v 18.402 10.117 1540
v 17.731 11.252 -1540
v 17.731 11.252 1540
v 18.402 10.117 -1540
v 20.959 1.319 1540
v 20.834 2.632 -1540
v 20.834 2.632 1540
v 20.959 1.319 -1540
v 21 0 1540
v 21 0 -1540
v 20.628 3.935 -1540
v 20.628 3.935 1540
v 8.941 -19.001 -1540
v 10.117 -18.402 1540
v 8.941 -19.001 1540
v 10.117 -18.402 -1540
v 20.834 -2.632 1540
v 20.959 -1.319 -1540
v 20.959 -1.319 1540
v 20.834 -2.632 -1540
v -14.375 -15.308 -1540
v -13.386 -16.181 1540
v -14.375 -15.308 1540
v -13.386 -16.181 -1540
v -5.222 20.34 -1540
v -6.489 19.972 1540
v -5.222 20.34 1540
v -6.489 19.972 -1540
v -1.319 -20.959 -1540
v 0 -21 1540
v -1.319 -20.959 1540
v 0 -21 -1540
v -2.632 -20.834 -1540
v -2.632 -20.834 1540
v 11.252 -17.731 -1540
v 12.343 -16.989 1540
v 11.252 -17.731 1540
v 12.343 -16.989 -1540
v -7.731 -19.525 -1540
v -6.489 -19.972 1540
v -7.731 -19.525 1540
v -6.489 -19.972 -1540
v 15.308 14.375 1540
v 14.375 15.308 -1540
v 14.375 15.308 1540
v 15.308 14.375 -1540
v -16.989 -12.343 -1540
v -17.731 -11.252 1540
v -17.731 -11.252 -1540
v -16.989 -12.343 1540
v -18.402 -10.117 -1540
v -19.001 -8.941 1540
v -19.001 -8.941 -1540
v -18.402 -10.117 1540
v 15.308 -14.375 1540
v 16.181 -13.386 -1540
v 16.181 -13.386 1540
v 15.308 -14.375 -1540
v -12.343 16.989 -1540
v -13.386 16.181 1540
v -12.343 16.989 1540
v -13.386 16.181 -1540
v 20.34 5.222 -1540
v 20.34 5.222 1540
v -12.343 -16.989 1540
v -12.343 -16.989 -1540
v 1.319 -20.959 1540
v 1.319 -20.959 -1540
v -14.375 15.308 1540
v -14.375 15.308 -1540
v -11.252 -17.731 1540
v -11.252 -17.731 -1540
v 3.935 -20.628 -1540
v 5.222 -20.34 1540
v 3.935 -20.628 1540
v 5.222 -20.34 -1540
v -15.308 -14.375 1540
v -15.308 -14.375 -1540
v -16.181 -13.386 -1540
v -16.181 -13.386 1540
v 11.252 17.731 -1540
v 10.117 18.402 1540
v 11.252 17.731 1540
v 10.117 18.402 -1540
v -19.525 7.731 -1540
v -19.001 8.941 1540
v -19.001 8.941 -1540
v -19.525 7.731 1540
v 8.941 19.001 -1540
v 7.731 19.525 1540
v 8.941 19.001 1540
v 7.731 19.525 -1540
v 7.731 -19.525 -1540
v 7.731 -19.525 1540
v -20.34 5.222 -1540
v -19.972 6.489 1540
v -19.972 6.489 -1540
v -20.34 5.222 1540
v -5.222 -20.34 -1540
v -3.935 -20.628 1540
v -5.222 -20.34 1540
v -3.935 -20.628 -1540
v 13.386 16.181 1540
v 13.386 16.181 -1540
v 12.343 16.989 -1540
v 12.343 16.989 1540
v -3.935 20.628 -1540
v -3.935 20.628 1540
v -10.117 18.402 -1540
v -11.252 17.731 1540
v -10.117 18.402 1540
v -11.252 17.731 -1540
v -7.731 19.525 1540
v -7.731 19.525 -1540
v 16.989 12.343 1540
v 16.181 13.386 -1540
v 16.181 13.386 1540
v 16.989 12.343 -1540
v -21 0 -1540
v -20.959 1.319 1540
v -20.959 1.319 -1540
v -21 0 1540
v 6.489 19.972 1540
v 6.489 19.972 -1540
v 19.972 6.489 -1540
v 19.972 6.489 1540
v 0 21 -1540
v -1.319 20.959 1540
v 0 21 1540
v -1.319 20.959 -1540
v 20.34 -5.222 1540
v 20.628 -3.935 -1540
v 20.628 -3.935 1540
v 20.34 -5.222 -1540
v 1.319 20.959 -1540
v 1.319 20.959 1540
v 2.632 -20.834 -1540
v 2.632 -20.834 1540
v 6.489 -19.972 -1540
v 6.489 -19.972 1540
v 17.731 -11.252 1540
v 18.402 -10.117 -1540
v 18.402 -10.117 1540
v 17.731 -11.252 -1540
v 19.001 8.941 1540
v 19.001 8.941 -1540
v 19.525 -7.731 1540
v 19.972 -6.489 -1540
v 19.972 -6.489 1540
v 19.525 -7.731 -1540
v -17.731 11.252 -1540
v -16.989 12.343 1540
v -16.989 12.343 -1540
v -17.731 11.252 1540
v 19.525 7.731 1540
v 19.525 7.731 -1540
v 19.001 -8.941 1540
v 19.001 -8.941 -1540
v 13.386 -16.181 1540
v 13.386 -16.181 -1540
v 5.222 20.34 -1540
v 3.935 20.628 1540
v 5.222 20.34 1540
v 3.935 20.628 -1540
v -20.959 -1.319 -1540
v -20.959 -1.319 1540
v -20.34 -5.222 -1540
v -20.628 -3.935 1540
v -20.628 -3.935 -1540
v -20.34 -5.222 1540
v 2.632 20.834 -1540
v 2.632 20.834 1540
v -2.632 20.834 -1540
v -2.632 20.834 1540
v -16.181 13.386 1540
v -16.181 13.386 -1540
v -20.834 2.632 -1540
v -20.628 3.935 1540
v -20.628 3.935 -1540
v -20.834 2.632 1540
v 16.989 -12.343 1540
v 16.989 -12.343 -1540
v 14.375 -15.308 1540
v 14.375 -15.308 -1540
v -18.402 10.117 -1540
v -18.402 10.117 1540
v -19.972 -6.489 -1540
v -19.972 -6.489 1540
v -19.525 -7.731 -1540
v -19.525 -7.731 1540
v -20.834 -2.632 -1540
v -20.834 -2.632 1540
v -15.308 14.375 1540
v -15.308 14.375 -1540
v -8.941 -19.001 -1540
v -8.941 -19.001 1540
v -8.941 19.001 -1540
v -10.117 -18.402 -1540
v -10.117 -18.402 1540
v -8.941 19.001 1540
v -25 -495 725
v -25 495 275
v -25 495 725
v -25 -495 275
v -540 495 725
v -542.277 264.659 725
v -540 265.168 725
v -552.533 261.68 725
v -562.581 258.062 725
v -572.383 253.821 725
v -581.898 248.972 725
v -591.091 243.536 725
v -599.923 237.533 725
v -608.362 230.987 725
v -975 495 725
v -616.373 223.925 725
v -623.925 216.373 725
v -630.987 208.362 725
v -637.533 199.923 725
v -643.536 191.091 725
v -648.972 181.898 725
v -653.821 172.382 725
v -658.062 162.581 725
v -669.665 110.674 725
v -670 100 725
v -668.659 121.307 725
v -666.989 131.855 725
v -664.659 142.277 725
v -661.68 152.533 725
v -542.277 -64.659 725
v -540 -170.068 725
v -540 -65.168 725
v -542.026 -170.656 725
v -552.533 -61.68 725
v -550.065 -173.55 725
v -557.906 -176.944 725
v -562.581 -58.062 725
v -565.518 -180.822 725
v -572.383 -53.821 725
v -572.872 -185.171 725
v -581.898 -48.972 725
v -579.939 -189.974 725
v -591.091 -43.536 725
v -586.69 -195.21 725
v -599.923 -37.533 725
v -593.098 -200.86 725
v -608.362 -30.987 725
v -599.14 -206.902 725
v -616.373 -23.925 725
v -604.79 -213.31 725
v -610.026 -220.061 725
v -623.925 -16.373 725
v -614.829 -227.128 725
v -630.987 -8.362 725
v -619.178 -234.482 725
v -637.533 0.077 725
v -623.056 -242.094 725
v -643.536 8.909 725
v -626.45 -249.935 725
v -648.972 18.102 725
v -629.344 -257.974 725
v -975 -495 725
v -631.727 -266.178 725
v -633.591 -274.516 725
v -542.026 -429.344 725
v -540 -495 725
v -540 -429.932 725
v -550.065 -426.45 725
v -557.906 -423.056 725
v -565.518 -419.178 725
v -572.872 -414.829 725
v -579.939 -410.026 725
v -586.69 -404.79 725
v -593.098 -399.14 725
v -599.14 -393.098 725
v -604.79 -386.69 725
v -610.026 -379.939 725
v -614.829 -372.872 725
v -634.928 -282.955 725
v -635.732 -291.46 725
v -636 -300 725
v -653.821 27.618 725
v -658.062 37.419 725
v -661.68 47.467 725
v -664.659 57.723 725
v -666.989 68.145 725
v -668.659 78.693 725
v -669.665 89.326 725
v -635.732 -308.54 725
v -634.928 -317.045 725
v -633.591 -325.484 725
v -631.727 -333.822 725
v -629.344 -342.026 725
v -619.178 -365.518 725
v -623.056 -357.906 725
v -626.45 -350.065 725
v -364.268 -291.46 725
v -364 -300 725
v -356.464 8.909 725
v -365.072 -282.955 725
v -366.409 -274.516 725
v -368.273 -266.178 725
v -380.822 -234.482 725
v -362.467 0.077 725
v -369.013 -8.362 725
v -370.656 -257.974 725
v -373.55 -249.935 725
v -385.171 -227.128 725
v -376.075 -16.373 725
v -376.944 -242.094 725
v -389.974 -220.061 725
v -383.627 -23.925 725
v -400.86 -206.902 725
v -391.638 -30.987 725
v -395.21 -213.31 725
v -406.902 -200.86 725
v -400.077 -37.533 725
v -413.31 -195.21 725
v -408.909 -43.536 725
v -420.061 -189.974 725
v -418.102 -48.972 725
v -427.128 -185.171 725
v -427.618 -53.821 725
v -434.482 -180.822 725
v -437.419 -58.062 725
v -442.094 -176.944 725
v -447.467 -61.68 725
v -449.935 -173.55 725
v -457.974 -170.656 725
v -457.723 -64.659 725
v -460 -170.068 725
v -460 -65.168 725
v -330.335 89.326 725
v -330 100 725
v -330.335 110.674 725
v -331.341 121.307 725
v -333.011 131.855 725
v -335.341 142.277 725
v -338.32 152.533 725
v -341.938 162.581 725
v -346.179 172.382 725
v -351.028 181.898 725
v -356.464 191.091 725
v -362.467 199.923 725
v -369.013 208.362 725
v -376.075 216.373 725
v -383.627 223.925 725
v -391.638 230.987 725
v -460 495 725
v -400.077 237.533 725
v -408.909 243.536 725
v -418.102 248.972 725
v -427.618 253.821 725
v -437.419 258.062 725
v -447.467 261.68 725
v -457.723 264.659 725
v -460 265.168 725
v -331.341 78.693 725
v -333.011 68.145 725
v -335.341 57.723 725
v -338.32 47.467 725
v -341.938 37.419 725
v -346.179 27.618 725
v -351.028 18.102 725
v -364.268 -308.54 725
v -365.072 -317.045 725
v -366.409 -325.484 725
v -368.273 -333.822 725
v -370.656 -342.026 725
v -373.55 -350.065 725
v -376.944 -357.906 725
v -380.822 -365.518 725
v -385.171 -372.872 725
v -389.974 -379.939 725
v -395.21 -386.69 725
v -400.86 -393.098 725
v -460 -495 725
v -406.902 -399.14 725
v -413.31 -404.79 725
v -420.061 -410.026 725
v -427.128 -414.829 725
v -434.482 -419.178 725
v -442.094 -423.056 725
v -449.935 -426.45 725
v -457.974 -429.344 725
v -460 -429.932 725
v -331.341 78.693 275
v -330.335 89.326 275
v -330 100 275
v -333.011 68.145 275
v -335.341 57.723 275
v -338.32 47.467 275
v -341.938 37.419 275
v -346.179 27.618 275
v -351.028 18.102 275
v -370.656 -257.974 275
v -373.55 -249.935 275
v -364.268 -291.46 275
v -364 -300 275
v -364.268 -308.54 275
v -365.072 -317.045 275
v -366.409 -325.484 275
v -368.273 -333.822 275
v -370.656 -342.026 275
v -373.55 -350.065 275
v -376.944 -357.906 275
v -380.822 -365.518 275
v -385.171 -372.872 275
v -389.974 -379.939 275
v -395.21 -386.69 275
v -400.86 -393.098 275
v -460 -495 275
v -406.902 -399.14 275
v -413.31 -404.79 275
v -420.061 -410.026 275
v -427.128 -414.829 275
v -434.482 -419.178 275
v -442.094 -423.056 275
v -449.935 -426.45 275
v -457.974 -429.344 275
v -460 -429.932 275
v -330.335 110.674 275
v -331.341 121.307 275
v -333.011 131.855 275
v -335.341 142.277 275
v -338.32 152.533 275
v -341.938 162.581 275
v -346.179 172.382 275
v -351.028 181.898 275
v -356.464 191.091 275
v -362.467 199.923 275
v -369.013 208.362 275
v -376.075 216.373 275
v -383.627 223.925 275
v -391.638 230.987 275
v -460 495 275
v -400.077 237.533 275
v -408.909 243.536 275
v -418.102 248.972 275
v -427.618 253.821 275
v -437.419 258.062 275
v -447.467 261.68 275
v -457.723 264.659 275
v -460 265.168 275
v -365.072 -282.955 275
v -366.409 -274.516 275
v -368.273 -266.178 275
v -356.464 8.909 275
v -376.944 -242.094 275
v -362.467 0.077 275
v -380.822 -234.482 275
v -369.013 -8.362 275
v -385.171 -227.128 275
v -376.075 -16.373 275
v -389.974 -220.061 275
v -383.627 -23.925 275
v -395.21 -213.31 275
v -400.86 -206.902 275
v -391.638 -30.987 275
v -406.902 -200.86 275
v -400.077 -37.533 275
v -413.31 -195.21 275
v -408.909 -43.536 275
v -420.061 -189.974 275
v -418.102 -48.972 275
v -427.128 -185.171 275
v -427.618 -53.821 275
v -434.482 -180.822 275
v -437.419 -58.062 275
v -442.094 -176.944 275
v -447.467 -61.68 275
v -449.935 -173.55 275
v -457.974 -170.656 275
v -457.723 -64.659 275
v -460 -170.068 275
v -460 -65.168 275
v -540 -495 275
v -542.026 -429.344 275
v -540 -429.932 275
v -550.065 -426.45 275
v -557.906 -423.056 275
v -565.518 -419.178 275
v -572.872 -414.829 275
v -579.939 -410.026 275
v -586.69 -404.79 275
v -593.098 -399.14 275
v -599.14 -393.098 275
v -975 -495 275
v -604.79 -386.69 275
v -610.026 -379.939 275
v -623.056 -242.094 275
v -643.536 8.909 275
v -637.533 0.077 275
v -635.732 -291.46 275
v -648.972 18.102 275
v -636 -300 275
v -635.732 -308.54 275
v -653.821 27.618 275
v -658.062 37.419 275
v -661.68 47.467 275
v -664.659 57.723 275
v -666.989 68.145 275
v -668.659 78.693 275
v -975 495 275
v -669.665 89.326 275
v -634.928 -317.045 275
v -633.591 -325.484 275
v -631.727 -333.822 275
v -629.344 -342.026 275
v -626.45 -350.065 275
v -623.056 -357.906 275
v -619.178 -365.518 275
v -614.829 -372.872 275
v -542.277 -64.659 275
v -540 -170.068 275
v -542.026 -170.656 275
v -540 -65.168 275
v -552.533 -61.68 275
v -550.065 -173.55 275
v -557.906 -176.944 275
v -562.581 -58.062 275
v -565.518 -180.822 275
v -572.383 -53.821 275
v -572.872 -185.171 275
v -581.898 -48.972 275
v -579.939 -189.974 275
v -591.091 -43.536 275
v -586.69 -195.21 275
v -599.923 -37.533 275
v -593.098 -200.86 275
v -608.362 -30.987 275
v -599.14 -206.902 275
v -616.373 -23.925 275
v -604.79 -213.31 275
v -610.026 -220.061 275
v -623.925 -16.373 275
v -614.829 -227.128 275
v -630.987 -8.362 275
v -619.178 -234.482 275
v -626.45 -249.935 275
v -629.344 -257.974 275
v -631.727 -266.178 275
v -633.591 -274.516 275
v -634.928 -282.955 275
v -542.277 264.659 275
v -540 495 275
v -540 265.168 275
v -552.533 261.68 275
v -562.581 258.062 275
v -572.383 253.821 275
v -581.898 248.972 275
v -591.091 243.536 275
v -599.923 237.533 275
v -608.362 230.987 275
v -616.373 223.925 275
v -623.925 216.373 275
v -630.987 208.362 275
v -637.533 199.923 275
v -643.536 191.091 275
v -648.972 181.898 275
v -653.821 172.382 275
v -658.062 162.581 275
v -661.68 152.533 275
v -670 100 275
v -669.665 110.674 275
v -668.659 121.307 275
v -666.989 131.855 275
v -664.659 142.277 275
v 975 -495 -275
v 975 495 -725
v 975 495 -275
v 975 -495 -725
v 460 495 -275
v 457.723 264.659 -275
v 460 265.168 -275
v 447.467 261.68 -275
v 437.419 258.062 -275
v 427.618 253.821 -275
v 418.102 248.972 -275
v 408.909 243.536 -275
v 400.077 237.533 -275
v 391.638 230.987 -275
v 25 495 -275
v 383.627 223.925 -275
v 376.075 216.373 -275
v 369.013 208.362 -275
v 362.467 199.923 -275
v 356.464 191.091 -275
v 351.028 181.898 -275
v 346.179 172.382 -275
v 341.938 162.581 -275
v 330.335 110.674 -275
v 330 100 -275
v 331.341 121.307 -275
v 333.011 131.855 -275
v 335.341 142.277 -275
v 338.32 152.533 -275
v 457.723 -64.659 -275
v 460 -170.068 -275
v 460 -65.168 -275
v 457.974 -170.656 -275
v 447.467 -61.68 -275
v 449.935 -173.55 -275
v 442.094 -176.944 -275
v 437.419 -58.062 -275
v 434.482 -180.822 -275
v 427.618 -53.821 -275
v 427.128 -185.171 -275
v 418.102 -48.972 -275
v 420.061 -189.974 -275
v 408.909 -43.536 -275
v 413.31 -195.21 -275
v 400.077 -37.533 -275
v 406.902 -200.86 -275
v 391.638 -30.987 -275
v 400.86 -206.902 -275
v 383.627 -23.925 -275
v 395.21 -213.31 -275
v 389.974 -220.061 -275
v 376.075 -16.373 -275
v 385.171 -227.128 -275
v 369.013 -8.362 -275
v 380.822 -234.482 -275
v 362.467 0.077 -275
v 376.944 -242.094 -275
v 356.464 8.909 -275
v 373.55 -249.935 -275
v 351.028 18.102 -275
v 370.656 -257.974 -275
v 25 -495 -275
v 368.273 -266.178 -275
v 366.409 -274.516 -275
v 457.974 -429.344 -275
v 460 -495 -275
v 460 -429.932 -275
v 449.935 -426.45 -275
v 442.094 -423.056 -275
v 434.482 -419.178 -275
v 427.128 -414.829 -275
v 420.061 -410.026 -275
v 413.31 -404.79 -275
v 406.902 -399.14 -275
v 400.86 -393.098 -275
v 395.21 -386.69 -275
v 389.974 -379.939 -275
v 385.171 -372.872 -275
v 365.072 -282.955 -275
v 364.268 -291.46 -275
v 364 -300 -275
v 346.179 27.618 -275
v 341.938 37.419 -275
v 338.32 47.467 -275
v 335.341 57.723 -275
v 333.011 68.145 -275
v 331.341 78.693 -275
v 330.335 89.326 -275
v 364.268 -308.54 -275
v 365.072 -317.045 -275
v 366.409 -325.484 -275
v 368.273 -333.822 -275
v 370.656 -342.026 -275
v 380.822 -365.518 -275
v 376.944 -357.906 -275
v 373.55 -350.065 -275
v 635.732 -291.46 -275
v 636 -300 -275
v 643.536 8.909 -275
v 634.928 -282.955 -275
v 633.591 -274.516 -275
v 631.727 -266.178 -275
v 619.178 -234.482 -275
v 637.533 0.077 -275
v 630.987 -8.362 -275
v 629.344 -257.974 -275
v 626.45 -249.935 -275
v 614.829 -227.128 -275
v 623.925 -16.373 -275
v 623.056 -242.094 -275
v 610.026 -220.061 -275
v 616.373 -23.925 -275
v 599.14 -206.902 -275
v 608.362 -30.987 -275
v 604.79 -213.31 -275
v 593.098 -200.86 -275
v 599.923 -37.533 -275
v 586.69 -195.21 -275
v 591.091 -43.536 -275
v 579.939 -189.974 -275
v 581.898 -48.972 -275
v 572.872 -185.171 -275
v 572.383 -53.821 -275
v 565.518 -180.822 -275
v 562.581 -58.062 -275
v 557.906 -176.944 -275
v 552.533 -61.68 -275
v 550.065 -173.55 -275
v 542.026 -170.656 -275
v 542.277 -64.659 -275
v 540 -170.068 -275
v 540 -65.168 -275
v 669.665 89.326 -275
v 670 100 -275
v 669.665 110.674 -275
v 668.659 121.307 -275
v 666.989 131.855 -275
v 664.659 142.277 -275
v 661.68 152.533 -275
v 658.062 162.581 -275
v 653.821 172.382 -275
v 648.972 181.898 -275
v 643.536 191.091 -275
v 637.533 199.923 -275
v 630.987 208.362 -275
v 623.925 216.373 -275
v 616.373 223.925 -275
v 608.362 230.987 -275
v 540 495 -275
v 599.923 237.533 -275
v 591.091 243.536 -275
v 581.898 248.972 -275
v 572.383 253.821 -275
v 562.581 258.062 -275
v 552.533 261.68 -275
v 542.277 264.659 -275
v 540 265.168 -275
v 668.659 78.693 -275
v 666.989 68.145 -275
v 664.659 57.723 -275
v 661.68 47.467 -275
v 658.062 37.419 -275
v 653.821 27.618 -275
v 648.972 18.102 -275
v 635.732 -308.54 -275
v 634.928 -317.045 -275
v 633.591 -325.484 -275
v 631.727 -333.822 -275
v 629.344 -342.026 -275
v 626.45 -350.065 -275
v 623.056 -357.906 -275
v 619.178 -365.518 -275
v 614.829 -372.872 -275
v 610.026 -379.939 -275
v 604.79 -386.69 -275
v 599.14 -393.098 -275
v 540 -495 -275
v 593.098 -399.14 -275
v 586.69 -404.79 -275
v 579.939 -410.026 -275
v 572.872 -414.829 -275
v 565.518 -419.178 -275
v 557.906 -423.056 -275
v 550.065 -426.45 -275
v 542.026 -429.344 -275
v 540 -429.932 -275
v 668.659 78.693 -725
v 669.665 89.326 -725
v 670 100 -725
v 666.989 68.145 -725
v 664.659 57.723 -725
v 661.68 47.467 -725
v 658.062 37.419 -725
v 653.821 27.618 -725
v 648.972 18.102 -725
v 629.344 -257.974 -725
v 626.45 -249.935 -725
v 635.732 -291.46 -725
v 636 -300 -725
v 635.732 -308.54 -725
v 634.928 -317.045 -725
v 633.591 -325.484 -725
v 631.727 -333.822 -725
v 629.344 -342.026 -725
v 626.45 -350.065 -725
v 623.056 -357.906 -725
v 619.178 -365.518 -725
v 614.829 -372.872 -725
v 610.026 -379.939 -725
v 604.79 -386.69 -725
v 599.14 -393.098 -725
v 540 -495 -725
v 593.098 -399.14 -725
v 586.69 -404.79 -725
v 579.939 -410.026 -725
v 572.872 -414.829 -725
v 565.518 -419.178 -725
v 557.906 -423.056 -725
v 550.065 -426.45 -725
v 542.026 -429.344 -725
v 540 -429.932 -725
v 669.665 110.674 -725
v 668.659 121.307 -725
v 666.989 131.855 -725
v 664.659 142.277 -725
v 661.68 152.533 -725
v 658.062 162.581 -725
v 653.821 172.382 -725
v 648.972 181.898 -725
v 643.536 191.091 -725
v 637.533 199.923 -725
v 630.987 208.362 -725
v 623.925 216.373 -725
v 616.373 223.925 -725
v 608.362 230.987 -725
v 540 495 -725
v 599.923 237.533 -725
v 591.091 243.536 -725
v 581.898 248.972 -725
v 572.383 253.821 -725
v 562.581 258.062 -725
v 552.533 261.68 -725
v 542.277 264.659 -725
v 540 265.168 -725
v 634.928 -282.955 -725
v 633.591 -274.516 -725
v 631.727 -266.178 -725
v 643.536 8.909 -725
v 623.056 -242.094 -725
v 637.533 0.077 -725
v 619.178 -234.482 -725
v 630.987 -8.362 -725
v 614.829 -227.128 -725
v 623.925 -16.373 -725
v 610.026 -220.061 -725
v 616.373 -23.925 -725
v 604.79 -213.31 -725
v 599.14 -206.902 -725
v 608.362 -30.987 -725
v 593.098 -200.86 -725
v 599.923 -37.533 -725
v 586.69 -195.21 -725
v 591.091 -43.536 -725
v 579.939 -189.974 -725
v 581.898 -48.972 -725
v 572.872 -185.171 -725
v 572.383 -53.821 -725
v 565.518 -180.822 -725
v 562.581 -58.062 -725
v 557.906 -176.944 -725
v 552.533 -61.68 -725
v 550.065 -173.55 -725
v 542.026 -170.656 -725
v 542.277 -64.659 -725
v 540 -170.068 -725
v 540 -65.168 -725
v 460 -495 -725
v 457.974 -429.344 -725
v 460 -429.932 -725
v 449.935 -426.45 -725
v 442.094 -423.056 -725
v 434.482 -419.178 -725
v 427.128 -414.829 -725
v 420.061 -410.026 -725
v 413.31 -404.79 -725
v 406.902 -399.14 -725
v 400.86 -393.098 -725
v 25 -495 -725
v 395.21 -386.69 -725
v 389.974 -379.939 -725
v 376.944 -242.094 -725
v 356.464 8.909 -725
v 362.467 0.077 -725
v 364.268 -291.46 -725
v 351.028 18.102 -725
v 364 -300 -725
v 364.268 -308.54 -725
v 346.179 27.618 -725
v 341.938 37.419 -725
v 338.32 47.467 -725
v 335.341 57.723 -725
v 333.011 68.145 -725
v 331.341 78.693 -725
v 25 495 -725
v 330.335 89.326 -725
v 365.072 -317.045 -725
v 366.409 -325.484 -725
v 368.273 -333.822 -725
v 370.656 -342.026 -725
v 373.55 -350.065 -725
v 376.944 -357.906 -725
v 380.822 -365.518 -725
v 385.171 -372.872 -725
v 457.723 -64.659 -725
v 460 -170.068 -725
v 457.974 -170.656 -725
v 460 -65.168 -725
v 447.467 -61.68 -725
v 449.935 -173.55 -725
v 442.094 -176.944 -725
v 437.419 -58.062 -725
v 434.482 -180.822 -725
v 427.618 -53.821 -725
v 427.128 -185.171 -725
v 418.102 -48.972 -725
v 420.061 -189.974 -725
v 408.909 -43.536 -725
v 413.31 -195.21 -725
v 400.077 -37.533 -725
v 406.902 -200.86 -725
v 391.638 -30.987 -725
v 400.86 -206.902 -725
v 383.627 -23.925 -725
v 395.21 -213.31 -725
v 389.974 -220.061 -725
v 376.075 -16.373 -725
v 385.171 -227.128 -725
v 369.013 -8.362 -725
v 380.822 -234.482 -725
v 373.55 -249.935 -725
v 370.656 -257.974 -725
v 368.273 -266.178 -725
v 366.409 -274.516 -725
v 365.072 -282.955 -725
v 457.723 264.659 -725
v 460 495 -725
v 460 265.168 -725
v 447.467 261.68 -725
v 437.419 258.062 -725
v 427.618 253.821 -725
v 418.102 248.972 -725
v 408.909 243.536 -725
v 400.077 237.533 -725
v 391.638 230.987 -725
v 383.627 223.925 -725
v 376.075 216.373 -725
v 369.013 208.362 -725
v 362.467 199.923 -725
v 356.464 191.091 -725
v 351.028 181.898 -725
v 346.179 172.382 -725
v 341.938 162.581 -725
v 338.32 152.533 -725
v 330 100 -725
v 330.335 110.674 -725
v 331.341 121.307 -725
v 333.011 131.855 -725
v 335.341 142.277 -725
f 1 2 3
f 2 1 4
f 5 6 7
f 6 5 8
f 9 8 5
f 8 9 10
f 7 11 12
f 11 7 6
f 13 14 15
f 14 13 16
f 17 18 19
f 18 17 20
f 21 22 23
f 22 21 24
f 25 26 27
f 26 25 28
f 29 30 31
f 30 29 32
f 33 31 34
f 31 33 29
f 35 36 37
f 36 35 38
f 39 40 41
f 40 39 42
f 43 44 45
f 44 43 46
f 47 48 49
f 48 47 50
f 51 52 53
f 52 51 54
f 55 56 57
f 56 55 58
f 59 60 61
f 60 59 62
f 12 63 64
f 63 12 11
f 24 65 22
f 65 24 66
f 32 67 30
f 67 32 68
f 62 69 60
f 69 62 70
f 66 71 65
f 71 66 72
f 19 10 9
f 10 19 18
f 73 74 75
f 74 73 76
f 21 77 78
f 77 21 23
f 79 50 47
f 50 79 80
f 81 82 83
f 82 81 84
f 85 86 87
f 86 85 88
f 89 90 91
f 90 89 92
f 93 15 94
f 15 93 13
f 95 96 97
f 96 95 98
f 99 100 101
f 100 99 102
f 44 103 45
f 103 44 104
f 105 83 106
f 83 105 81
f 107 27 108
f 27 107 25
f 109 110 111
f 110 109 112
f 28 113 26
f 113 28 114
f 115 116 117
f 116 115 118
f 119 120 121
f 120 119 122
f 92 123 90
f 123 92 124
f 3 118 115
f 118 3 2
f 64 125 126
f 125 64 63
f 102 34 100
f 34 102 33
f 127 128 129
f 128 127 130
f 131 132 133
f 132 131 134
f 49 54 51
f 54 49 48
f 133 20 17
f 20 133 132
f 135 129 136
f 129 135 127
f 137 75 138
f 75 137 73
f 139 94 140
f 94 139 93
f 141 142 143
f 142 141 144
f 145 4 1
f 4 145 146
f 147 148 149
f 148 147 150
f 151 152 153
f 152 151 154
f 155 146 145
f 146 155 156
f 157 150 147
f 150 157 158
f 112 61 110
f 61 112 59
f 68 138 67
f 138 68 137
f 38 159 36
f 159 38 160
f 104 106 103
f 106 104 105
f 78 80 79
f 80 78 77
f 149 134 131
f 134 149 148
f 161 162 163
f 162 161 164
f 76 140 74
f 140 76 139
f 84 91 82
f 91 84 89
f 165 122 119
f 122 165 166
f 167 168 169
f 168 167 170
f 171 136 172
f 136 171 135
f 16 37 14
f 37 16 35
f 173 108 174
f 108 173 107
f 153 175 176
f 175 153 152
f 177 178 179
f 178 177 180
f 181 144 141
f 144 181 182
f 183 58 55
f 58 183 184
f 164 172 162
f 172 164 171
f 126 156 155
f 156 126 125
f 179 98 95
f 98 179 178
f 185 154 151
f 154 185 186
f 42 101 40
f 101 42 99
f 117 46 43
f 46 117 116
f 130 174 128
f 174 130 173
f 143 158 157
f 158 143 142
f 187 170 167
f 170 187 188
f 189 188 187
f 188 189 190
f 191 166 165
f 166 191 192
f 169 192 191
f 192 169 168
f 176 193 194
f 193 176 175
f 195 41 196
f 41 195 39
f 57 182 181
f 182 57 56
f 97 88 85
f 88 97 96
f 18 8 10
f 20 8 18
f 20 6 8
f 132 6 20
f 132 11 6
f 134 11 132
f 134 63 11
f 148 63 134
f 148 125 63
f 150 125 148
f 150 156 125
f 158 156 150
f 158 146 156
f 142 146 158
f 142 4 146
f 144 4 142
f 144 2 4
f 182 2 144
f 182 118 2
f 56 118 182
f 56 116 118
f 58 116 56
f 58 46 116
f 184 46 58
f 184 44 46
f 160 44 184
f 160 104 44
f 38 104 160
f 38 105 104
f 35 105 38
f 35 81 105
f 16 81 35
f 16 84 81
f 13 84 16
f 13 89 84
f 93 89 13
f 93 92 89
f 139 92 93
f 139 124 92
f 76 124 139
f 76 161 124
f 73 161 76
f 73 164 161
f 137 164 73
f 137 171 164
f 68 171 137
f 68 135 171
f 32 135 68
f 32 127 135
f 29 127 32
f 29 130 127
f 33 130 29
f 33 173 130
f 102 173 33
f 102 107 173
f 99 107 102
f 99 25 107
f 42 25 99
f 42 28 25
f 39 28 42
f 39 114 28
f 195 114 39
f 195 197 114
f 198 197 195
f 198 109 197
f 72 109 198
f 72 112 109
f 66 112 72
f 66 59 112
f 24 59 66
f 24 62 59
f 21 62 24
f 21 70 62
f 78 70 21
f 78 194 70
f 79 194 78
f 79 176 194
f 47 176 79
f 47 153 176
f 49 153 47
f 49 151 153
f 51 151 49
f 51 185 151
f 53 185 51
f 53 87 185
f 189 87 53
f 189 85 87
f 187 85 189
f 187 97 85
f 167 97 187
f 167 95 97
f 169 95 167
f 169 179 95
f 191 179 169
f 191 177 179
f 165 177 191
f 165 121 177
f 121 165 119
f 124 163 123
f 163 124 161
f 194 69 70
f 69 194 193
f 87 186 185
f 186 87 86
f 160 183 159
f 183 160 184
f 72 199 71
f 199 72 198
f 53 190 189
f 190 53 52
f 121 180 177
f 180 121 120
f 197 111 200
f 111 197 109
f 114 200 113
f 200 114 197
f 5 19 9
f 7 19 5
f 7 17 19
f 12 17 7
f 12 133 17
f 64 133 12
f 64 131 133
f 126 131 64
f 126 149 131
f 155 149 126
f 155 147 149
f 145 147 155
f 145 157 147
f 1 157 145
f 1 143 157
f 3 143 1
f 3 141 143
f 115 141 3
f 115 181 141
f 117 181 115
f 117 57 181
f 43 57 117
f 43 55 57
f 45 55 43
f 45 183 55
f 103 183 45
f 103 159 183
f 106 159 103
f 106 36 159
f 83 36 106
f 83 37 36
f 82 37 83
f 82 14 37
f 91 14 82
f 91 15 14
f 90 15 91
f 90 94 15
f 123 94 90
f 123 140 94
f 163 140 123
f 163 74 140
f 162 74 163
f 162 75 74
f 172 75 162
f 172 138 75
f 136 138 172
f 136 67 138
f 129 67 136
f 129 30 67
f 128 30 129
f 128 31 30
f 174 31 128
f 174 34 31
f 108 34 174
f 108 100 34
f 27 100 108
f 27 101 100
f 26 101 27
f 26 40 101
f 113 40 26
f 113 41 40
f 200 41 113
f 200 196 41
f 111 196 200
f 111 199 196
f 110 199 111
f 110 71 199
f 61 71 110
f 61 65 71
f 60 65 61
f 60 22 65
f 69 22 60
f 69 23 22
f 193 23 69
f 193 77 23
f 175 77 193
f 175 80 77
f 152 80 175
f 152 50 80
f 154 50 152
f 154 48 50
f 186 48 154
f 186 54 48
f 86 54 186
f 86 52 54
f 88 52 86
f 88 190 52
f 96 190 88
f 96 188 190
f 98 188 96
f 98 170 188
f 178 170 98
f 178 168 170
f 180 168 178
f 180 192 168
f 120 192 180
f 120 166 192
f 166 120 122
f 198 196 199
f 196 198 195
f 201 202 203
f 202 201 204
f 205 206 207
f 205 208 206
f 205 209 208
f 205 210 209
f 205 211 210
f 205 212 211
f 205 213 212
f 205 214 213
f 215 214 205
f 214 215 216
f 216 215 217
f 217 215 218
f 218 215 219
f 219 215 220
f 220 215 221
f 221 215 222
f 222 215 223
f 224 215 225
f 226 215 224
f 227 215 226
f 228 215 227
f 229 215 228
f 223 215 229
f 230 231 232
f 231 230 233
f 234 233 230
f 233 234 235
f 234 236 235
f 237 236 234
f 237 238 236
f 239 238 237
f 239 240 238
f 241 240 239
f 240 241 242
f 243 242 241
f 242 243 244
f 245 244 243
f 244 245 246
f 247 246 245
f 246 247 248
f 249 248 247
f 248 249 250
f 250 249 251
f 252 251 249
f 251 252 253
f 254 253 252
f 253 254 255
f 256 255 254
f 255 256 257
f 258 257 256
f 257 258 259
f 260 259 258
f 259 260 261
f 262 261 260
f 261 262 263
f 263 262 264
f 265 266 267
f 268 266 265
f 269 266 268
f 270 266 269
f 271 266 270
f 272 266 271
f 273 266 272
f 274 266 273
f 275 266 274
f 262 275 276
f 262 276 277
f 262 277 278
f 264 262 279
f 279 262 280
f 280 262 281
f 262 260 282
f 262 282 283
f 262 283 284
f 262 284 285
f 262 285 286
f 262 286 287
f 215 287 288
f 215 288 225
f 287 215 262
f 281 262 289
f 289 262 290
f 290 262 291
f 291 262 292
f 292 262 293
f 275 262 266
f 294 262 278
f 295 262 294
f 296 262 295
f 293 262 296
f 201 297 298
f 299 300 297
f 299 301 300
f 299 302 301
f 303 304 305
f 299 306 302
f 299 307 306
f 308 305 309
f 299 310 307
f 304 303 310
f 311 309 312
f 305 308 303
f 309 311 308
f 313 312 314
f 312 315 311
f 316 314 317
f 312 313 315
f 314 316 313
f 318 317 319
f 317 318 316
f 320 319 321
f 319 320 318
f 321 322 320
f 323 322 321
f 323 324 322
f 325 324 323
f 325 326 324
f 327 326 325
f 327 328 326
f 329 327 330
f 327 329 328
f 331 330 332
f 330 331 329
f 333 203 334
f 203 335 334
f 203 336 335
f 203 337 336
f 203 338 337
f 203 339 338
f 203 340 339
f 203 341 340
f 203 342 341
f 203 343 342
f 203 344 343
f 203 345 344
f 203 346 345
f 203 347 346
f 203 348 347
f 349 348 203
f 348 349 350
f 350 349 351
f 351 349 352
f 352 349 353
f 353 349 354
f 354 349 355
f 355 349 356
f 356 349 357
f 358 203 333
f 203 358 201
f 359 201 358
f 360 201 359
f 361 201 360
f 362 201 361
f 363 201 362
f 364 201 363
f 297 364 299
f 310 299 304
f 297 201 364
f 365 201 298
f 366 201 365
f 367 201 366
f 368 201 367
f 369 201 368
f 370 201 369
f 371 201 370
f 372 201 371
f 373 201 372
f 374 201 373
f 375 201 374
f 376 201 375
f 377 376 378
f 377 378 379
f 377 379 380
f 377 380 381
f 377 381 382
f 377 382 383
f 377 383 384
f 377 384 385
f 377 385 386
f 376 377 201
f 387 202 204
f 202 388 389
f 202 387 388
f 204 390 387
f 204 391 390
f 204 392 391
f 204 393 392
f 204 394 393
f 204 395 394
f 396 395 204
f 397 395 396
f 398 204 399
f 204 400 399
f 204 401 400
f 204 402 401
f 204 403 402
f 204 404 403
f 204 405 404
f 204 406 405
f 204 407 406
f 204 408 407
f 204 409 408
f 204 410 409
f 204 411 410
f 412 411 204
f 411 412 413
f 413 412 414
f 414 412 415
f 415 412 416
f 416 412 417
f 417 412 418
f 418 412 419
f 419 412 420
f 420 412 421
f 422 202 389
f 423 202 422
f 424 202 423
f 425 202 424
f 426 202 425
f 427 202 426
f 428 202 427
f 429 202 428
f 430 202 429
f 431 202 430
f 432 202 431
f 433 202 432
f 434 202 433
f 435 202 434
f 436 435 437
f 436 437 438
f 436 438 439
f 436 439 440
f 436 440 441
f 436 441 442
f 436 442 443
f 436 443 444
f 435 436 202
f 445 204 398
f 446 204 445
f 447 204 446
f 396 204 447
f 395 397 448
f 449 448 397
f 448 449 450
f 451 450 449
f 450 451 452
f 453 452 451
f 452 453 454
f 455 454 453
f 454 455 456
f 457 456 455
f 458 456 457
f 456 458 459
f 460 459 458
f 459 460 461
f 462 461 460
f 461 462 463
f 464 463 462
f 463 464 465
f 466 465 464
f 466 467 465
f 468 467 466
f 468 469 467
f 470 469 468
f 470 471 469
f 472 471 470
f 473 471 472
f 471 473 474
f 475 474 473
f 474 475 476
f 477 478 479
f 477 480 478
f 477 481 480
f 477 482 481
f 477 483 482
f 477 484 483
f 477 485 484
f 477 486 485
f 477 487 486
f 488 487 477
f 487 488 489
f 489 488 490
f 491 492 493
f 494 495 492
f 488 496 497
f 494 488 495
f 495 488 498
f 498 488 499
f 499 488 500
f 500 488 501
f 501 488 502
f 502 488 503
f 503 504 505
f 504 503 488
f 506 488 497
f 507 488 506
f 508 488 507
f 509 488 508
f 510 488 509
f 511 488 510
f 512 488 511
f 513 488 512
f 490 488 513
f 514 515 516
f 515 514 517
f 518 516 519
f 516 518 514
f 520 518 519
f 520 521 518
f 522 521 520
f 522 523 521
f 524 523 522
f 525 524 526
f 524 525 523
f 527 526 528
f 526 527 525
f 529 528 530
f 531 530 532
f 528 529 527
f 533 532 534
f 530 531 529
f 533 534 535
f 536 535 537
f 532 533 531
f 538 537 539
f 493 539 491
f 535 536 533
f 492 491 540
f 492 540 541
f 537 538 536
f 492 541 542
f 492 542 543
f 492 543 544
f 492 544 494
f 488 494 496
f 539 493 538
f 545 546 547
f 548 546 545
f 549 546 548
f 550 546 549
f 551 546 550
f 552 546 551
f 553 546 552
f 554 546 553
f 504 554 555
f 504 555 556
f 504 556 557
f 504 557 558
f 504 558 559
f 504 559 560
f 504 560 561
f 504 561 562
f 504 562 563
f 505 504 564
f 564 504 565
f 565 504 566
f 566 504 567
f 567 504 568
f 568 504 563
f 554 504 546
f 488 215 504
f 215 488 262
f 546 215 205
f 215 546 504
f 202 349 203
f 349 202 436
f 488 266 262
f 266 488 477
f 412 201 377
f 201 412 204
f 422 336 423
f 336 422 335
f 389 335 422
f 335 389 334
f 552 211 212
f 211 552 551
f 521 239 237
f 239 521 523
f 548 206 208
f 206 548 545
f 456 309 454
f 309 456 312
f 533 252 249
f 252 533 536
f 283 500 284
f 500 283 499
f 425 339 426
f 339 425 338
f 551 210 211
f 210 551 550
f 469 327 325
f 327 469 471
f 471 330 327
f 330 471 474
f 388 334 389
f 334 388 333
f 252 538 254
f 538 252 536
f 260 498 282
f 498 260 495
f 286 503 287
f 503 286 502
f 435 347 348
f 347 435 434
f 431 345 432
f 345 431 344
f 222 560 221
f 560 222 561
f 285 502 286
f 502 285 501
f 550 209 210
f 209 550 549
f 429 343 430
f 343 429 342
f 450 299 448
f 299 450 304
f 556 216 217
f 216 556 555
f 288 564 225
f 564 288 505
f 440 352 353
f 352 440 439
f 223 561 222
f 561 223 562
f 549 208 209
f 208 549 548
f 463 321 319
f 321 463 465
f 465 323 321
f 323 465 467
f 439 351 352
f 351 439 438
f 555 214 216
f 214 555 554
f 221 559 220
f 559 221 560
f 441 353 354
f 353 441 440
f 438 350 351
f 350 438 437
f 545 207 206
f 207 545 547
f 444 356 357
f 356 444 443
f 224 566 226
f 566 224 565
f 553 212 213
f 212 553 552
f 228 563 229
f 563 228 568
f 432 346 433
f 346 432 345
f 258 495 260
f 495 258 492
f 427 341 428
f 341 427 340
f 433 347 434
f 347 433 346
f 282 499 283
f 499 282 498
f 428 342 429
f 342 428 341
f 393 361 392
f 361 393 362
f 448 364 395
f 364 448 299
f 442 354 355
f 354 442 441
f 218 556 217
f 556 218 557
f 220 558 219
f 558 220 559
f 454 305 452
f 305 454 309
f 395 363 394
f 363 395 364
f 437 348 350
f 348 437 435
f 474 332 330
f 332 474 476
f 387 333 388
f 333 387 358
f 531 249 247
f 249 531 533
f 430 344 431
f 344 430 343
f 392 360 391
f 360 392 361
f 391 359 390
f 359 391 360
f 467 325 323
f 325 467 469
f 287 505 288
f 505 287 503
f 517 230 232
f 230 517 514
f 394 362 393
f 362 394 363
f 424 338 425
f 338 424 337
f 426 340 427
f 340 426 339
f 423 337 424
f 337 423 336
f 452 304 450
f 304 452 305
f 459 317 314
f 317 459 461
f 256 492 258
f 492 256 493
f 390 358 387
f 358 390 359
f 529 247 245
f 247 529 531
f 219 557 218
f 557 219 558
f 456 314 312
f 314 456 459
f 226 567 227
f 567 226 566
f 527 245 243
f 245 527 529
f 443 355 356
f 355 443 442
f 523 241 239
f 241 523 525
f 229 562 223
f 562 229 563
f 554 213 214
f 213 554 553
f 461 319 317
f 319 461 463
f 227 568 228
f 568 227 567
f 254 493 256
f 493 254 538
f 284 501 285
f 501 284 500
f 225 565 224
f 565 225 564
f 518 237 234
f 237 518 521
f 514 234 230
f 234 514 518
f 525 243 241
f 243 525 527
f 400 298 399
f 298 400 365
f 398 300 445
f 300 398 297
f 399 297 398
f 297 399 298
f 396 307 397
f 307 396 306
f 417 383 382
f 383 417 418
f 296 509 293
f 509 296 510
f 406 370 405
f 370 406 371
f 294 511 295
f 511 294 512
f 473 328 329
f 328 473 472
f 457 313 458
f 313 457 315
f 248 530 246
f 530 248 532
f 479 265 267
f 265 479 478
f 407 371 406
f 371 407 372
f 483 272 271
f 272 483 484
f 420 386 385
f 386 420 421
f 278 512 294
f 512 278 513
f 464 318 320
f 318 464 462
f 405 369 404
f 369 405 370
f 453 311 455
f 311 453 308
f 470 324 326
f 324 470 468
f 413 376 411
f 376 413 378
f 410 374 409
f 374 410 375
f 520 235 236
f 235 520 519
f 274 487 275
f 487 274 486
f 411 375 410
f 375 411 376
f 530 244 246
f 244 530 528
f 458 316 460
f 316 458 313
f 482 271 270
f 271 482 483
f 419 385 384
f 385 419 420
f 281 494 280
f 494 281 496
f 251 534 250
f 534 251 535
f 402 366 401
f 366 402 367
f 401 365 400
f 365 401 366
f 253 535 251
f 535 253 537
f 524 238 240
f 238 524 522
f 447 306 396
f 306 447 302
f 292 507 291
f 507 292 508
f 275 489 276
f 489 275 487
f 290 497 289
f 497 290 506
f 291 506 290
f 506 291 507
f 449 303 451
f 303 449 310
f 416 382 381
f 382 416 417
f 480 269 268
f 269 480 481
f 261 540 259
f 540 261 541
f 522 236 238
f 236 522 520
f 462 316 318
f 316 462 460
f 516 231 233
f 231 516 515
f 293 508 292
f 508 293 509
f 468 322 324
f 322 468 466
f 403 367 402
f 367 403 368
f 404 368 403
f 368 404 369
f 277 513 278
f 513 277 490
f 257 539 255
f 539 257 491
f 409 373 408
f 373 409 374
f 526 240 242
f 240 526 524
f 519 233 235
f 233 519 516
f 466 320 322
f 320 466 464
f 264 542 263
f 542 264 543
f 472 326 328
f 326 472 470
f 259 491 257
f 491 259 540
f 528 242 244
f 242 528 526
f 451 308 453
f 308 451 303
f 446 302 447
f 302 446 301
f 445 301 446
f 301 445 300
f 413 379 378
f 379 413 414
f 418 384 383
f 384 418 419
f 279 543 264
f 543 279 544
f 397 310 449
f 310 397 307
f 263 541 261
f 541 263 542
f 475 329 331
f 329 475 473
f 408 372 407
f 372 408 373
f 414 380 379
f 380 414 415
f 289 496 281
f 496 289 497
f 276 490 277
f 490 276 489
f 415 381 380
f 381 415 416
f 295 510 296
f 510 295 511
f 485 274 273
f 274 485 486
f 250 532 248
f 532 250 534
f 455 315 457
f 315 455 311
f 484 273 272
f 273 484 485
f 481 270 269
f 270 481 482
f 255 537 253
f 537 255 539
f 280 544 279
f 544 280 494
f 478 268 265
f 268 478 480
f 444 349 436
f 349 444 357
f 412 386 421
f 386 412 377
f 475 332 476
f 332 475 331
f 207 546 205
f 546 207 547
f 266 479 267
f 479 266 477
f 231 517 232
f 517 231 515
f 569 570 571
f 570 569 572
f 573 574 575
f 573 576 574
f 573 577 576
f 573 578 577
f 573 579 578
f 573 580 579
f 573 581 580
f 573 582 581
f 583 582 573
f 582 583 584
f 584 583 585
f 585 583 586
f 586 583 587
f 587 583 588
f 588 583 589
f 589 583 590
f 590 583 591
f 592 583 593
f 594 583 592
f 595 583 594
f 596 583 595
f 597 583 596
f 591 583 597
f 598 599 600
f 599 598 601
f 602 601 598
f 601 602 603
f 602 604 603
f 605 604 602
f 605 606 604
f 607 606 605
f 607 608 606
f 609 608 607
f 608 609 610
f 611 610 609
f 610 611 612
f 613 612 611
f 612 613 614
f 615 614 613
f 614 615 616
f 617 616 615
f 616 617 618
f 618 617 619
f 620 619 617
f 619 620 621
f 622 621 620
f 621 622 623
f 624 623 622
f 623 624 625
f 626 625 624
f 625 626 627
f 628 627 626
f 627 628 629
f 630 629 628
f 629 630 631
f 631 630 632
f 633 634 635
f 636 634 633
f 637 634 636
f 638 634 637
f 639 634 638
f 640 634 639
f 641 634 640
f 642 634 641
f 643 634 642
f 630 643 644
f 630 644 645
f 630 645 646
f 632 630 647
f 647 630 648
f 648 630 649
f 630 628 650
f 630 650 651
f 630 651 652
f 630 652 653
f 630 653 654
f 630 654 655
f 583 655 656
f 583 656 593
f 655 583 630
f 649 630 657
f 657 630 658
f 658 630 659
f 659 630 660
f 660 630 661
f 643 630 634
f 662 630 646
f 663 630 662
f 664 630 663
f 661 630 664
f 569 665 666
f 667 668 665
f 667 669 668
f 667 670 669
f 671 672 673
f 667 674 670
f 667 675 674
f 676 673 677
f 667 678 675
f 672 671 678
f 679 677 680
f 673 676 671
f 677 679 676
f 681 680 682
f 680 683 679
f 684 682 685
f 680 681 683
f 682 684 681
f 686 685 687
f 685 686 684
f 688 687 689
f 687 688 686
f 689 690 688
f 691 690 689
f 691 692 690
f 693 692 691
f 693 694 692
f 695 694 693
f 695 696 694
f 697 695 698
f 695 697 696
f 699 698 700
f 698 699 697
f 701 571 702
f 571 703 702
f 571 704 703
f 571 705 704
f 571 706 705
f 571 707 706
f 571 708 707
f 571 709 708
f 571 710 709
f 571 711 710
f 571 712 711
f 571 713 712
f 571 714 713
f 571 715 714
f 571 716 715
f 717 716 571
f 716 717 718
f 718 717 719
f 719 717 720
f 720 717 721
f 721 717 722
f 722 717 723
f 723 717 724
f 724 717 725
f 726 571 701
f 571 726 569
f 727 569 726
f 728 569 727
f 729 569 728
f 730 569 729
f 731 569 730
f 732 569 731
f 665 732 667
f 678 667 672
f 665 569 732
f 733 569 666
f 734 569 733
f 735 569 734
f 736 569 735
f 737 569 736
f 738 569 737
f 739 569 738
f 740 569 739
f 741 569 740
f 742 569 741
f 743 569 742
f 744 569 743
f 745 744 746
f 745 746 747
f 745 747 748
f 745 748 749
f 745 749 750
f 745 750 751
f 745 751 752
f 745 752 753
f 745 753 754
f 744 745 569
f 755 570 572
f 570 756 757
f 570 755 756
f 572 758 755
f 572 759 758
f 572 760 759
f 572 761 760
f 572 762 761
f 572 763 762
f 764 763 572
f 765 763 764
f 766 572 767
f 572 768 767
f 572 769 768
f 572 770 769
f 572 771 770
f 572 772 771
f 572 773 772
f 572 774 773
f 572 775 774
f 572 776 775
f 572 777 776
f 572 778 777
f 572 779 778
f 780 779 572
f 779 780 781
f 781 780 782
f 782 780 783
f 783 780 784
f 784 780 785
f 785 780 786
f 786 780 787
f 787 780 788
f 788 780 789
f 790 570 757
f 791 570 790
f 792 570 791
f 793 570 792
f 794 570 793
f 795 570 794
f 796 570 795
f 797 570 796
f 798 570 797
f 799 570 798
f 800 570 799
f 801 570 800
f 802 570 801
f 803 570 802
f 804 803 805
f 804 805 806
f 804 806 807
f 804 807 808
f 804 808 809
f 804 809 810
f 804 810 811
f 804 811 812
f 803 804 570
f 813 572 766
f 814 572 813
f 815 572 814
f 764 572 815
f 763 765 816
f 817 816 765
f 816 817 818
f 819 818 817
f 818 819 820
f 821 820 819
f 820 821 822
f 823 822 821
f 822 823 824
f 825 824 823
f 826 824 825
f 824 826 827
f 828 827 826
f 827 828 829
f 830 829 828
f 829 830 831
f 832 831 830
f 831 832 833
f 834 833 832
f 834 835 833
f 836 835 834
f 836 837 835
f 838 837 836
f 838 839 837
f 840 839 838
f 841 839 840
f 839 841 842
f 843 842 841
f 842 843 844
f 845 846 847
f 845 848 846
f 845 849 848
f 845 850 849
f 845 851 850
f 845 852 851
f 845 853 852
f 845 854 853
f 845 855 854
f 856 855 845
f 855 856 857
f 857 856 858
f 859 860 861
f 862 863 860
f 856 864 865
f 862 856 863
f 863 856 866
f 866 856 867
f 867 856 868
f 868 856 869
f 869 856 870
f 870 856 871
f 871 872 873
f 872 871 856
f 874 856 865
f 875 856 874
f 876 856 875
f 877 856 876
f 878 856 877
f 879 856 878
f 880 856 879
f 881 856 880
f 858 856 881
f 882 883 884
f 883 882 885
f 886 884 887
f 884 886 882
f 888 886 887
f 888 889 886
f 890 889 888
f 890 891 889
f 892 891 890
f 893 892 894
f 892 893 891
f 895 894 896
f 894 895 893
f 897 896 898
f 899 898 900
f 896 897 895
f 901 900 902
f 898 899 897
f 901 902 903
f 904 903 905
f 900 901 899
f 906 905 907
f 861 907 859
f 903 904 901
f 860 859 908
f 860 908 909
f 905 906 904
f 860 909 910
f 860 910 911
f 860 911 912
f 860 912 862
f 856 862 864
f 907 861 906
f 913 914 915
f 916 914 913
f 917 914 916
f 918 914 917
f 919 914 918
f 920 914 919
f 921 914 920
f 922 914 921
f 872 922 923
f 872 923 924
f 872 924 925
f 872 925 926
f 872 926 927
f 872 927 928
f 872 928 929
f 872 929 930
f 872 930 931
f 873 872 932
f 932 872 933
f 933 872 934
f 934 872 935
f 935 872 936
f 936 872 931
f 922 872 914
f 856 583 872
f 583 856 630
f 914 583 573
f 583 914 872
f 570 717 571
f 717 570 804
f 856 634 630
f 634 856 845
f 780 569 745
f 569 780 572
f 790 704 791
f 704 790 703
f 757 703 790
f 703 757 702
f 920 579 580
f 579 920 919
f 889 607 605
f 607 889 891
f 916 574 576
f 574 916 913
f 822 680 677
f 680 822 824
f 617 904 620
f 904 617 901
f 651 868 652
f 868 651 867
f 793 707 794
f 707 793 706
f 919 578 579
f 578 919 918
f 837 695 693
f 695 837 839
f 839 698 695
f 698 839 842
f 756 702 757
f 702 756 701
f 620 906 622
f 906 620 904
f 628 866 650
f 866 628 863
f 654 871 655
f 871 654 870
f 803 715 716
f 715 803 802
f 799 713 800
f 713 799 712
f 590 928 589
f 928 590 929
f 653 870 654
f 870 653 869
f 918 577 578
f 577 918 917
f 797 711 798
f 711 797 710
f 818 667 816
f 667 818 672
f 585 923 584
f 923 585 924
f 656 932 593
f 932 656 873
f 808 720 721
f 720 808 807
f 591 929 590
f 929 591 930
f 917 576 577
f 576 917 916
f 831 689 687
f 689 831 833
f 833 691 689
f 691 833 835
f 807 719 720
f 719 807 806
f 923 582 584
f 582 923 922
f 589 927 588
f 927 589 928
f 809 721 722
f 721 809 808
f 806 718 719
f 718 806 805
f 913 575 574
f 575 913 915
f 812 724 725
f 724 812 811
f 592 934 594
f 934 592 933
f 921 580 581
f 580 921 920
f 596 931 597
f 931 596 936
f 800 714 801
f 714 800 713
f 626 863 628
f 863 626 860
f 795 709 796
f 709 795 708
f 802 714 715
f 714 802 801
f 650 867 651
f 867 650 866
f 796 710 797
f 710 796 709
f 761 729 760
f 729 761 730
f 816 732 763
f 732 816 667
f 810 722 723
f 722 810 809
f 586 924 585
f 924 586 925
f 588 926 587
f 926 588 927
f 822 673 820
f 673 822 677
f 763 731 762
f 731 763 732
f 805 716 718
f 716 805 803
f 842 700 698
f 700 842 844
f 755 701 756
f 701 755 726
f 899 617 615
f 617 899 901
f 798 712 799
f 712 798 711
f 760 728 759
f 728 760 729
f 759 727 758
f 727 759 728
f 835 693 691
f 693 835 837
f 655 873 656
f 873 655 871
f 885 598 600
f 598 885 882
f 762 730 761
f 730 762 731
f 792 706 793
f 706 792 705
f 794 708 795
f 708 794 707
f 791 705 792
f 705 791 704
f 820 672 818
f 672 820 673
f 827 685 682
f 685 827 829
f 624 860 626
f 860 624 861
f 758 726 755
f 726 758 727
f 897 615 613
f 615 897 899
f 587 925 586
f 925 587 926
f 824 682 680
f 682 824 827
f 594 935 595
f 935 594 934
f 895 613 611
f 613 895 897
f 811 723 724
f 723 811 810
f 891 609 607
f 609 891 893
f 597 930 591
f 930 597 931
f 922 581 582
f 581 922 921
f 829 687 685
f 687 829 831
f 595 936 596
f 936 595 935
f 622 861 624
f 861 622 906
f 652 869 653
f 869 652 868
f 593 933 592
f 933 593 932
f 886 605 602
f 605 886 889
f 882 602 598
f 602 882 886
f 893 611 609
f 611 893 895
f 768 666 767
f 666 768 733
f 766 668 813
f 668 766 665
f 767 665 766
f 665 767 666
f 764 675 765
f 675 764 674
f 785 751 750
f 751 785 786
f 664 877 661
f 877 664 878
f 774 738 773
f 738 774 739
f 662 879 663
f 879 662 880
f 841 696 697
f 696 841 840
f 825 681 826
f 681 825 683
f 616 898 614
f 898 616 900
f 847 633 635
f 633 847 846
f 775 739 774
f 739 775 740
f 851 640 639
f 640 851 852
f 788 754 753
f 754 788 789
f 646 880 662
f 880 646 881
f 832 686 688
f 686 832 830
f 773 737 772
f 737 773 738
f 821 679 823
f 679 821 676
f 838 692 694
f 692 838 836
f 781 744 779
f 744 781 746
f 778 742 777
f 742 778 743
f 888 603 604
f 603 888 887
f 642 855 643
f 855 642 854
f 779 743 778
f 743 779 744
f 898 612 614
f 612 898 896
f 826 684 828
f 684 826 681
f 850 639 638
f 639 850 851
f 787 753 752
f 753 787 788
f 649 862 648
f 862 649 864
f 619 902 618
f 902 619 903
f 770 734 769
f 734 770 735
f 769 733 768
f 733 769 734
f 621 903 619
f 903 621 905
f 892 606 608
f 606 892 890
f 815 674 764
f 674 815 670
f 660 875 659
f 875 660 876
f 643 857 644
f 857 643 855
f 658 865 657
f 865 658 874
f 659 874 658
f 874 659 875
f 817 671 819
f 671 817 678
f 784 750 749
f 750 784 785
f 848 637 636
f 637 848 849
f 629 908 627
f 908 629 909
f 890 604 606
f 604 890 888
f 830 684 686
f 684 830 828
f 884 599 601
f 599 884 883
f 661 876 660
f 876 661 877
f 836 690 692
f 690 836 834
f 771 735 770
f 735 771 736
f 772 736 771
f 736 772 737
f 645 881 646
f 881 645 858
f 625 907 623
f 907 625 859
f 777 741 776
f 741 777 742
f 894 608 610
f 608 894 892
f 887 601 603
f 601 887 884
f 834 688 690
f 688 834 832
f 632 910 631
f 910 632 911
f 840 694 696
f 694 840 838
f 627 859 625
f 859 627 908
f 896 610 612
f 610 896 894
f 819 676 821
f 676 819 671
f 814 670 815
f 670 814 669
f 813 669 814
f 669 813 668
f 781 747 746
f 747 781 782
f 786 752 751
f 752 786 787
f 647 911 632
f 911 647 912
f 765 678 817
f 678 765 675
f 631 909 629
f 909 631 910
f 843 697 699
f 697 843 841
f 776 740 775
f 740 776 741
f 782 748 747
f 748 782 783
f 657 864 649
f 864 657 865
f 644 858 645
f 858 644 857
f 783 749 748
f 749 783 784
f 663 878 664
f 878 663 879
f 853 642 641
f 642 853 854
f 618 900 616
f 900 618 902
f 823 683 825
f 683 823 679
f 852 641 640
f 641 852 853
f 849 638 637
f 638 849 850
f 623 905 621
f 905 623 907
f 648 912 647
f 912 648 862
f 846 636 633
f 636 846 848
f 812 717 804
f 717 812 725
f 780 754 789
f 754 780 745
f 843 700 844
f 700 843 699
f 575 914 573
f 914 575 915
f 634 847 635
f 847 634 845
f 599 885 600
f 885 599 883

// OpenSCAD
// ============================================================================
// PROJECT: XXXG-00W0 WING GUNDAM ZERO EW - LOWER FRAME STABILIZATION
// COMPONENT VAULT: BANDAI CAST RUNNER A - HEEL STABILIZERS A5 & A6
// AUTOMOTIVE RETROFIT: GM IMPALA ACTUATORS & SILVERADO MEDIUM-DUTY PISTONS
// ENGINEERING SPEC: ACTIVE MAGLEV BALANCING & REGENERATIVE GROUND TRACTION
// ============================================================================

$fn = 100; // Circular segment fidelity resolution count

// Structural Constants Scaled 1:1 for a 16.7-Meter Airframe Scale (mm)
foot_armor_length = 2200;               // Total longitudinal heel-to-toe span (mm)
heel_stabilizer_width = 950;            // Transverse ground anchor footprint (mm)
piston_bore_diameter = 340;             // GM suspension piston casing width (mm)
titanium_plate_wall = 60;               // Solid protective outer armor gauge (mm)
harness_conduit_width = 80;             // Embedded 4oz copper logic trace track (mm)

module Runner_A_Feet_Forge() {
    // Central Supply Injection Runner Axis (Molten Feed Line from Siphon Forge)
    color([0.24, 0.24, 0.26]) {
        cylinder(h = foot_armor_length * 1.4, d = 42, center = true);
        // Direct feed gates tracking straight into the part mold cavities
        translate() rotate() cylinder(h = 550, d = 22);
        translate([0, 0, -900]) rotate() cylinder(h = 550, d = 22);
    }
    
    // Instantiate Scaled Part Molds Symmetrically
    Cast_Heel_Stabilizer_Plates();
}

module Cast_Heel_Stabilizer_Plates() {
    // ---- PART A5: LEFT HEEL STABILIZER HULL HALF-SHELL ---- [Page 6, Step 2]
    translate([-500, 0, 500]) color([0.8, 0.8, 0.85]) {
        difference() {
            // Main solid thick foot protective shell block
            cube([heel_stabilizer_width, foot_armor_length * 0.45, 450], center = true);
            
            // Cylindrical Ingestion Bay for the GM Impala Balancing Actuator Stems
            translate([0, 100, 0])
                cylinder(h = 500, d = piston_bore_diameter, center = true);
                
            // Secondary Mounting Chamber for the Silverado Leaf-Spring Pistons
            translate([0, -300, 0])
                cylinder(h = 500, d = piston_bore_diameter * 0.8, center = true);
            
            // Continuous cast-in routing track for the 4oz solid-state wiring rails
            cube([harness_conduit_width, foot_armor_length, 600], center = true);
        }
    }
    
    // ---- PART A6: RIGHT HEEL STABILIZER HULL HALF-SHELL ---- [Page 6, Step 1]
    translate([500, 0, -500]) rotate() color([0.8, 0.8, 0.85]) {
        difference() {
            cube([heel_stabilizer_width, foot_armor_length * 0.45, 450], center = true);
            translate([0, 100, 0])
                cylinder(h = 500, d = piston_bore_diameter, center = true);
            translate([0, -300, 0])
                cylinder(h = 500, d = piston_bore_diameter * 0.8, center = true);
            cube([harness_conduit_width, foot_armor_length, 600], center = true);
        }
    }
}

// Render Master Assembly to Parameter Workspace
Runner_A_Feet_Forge();
